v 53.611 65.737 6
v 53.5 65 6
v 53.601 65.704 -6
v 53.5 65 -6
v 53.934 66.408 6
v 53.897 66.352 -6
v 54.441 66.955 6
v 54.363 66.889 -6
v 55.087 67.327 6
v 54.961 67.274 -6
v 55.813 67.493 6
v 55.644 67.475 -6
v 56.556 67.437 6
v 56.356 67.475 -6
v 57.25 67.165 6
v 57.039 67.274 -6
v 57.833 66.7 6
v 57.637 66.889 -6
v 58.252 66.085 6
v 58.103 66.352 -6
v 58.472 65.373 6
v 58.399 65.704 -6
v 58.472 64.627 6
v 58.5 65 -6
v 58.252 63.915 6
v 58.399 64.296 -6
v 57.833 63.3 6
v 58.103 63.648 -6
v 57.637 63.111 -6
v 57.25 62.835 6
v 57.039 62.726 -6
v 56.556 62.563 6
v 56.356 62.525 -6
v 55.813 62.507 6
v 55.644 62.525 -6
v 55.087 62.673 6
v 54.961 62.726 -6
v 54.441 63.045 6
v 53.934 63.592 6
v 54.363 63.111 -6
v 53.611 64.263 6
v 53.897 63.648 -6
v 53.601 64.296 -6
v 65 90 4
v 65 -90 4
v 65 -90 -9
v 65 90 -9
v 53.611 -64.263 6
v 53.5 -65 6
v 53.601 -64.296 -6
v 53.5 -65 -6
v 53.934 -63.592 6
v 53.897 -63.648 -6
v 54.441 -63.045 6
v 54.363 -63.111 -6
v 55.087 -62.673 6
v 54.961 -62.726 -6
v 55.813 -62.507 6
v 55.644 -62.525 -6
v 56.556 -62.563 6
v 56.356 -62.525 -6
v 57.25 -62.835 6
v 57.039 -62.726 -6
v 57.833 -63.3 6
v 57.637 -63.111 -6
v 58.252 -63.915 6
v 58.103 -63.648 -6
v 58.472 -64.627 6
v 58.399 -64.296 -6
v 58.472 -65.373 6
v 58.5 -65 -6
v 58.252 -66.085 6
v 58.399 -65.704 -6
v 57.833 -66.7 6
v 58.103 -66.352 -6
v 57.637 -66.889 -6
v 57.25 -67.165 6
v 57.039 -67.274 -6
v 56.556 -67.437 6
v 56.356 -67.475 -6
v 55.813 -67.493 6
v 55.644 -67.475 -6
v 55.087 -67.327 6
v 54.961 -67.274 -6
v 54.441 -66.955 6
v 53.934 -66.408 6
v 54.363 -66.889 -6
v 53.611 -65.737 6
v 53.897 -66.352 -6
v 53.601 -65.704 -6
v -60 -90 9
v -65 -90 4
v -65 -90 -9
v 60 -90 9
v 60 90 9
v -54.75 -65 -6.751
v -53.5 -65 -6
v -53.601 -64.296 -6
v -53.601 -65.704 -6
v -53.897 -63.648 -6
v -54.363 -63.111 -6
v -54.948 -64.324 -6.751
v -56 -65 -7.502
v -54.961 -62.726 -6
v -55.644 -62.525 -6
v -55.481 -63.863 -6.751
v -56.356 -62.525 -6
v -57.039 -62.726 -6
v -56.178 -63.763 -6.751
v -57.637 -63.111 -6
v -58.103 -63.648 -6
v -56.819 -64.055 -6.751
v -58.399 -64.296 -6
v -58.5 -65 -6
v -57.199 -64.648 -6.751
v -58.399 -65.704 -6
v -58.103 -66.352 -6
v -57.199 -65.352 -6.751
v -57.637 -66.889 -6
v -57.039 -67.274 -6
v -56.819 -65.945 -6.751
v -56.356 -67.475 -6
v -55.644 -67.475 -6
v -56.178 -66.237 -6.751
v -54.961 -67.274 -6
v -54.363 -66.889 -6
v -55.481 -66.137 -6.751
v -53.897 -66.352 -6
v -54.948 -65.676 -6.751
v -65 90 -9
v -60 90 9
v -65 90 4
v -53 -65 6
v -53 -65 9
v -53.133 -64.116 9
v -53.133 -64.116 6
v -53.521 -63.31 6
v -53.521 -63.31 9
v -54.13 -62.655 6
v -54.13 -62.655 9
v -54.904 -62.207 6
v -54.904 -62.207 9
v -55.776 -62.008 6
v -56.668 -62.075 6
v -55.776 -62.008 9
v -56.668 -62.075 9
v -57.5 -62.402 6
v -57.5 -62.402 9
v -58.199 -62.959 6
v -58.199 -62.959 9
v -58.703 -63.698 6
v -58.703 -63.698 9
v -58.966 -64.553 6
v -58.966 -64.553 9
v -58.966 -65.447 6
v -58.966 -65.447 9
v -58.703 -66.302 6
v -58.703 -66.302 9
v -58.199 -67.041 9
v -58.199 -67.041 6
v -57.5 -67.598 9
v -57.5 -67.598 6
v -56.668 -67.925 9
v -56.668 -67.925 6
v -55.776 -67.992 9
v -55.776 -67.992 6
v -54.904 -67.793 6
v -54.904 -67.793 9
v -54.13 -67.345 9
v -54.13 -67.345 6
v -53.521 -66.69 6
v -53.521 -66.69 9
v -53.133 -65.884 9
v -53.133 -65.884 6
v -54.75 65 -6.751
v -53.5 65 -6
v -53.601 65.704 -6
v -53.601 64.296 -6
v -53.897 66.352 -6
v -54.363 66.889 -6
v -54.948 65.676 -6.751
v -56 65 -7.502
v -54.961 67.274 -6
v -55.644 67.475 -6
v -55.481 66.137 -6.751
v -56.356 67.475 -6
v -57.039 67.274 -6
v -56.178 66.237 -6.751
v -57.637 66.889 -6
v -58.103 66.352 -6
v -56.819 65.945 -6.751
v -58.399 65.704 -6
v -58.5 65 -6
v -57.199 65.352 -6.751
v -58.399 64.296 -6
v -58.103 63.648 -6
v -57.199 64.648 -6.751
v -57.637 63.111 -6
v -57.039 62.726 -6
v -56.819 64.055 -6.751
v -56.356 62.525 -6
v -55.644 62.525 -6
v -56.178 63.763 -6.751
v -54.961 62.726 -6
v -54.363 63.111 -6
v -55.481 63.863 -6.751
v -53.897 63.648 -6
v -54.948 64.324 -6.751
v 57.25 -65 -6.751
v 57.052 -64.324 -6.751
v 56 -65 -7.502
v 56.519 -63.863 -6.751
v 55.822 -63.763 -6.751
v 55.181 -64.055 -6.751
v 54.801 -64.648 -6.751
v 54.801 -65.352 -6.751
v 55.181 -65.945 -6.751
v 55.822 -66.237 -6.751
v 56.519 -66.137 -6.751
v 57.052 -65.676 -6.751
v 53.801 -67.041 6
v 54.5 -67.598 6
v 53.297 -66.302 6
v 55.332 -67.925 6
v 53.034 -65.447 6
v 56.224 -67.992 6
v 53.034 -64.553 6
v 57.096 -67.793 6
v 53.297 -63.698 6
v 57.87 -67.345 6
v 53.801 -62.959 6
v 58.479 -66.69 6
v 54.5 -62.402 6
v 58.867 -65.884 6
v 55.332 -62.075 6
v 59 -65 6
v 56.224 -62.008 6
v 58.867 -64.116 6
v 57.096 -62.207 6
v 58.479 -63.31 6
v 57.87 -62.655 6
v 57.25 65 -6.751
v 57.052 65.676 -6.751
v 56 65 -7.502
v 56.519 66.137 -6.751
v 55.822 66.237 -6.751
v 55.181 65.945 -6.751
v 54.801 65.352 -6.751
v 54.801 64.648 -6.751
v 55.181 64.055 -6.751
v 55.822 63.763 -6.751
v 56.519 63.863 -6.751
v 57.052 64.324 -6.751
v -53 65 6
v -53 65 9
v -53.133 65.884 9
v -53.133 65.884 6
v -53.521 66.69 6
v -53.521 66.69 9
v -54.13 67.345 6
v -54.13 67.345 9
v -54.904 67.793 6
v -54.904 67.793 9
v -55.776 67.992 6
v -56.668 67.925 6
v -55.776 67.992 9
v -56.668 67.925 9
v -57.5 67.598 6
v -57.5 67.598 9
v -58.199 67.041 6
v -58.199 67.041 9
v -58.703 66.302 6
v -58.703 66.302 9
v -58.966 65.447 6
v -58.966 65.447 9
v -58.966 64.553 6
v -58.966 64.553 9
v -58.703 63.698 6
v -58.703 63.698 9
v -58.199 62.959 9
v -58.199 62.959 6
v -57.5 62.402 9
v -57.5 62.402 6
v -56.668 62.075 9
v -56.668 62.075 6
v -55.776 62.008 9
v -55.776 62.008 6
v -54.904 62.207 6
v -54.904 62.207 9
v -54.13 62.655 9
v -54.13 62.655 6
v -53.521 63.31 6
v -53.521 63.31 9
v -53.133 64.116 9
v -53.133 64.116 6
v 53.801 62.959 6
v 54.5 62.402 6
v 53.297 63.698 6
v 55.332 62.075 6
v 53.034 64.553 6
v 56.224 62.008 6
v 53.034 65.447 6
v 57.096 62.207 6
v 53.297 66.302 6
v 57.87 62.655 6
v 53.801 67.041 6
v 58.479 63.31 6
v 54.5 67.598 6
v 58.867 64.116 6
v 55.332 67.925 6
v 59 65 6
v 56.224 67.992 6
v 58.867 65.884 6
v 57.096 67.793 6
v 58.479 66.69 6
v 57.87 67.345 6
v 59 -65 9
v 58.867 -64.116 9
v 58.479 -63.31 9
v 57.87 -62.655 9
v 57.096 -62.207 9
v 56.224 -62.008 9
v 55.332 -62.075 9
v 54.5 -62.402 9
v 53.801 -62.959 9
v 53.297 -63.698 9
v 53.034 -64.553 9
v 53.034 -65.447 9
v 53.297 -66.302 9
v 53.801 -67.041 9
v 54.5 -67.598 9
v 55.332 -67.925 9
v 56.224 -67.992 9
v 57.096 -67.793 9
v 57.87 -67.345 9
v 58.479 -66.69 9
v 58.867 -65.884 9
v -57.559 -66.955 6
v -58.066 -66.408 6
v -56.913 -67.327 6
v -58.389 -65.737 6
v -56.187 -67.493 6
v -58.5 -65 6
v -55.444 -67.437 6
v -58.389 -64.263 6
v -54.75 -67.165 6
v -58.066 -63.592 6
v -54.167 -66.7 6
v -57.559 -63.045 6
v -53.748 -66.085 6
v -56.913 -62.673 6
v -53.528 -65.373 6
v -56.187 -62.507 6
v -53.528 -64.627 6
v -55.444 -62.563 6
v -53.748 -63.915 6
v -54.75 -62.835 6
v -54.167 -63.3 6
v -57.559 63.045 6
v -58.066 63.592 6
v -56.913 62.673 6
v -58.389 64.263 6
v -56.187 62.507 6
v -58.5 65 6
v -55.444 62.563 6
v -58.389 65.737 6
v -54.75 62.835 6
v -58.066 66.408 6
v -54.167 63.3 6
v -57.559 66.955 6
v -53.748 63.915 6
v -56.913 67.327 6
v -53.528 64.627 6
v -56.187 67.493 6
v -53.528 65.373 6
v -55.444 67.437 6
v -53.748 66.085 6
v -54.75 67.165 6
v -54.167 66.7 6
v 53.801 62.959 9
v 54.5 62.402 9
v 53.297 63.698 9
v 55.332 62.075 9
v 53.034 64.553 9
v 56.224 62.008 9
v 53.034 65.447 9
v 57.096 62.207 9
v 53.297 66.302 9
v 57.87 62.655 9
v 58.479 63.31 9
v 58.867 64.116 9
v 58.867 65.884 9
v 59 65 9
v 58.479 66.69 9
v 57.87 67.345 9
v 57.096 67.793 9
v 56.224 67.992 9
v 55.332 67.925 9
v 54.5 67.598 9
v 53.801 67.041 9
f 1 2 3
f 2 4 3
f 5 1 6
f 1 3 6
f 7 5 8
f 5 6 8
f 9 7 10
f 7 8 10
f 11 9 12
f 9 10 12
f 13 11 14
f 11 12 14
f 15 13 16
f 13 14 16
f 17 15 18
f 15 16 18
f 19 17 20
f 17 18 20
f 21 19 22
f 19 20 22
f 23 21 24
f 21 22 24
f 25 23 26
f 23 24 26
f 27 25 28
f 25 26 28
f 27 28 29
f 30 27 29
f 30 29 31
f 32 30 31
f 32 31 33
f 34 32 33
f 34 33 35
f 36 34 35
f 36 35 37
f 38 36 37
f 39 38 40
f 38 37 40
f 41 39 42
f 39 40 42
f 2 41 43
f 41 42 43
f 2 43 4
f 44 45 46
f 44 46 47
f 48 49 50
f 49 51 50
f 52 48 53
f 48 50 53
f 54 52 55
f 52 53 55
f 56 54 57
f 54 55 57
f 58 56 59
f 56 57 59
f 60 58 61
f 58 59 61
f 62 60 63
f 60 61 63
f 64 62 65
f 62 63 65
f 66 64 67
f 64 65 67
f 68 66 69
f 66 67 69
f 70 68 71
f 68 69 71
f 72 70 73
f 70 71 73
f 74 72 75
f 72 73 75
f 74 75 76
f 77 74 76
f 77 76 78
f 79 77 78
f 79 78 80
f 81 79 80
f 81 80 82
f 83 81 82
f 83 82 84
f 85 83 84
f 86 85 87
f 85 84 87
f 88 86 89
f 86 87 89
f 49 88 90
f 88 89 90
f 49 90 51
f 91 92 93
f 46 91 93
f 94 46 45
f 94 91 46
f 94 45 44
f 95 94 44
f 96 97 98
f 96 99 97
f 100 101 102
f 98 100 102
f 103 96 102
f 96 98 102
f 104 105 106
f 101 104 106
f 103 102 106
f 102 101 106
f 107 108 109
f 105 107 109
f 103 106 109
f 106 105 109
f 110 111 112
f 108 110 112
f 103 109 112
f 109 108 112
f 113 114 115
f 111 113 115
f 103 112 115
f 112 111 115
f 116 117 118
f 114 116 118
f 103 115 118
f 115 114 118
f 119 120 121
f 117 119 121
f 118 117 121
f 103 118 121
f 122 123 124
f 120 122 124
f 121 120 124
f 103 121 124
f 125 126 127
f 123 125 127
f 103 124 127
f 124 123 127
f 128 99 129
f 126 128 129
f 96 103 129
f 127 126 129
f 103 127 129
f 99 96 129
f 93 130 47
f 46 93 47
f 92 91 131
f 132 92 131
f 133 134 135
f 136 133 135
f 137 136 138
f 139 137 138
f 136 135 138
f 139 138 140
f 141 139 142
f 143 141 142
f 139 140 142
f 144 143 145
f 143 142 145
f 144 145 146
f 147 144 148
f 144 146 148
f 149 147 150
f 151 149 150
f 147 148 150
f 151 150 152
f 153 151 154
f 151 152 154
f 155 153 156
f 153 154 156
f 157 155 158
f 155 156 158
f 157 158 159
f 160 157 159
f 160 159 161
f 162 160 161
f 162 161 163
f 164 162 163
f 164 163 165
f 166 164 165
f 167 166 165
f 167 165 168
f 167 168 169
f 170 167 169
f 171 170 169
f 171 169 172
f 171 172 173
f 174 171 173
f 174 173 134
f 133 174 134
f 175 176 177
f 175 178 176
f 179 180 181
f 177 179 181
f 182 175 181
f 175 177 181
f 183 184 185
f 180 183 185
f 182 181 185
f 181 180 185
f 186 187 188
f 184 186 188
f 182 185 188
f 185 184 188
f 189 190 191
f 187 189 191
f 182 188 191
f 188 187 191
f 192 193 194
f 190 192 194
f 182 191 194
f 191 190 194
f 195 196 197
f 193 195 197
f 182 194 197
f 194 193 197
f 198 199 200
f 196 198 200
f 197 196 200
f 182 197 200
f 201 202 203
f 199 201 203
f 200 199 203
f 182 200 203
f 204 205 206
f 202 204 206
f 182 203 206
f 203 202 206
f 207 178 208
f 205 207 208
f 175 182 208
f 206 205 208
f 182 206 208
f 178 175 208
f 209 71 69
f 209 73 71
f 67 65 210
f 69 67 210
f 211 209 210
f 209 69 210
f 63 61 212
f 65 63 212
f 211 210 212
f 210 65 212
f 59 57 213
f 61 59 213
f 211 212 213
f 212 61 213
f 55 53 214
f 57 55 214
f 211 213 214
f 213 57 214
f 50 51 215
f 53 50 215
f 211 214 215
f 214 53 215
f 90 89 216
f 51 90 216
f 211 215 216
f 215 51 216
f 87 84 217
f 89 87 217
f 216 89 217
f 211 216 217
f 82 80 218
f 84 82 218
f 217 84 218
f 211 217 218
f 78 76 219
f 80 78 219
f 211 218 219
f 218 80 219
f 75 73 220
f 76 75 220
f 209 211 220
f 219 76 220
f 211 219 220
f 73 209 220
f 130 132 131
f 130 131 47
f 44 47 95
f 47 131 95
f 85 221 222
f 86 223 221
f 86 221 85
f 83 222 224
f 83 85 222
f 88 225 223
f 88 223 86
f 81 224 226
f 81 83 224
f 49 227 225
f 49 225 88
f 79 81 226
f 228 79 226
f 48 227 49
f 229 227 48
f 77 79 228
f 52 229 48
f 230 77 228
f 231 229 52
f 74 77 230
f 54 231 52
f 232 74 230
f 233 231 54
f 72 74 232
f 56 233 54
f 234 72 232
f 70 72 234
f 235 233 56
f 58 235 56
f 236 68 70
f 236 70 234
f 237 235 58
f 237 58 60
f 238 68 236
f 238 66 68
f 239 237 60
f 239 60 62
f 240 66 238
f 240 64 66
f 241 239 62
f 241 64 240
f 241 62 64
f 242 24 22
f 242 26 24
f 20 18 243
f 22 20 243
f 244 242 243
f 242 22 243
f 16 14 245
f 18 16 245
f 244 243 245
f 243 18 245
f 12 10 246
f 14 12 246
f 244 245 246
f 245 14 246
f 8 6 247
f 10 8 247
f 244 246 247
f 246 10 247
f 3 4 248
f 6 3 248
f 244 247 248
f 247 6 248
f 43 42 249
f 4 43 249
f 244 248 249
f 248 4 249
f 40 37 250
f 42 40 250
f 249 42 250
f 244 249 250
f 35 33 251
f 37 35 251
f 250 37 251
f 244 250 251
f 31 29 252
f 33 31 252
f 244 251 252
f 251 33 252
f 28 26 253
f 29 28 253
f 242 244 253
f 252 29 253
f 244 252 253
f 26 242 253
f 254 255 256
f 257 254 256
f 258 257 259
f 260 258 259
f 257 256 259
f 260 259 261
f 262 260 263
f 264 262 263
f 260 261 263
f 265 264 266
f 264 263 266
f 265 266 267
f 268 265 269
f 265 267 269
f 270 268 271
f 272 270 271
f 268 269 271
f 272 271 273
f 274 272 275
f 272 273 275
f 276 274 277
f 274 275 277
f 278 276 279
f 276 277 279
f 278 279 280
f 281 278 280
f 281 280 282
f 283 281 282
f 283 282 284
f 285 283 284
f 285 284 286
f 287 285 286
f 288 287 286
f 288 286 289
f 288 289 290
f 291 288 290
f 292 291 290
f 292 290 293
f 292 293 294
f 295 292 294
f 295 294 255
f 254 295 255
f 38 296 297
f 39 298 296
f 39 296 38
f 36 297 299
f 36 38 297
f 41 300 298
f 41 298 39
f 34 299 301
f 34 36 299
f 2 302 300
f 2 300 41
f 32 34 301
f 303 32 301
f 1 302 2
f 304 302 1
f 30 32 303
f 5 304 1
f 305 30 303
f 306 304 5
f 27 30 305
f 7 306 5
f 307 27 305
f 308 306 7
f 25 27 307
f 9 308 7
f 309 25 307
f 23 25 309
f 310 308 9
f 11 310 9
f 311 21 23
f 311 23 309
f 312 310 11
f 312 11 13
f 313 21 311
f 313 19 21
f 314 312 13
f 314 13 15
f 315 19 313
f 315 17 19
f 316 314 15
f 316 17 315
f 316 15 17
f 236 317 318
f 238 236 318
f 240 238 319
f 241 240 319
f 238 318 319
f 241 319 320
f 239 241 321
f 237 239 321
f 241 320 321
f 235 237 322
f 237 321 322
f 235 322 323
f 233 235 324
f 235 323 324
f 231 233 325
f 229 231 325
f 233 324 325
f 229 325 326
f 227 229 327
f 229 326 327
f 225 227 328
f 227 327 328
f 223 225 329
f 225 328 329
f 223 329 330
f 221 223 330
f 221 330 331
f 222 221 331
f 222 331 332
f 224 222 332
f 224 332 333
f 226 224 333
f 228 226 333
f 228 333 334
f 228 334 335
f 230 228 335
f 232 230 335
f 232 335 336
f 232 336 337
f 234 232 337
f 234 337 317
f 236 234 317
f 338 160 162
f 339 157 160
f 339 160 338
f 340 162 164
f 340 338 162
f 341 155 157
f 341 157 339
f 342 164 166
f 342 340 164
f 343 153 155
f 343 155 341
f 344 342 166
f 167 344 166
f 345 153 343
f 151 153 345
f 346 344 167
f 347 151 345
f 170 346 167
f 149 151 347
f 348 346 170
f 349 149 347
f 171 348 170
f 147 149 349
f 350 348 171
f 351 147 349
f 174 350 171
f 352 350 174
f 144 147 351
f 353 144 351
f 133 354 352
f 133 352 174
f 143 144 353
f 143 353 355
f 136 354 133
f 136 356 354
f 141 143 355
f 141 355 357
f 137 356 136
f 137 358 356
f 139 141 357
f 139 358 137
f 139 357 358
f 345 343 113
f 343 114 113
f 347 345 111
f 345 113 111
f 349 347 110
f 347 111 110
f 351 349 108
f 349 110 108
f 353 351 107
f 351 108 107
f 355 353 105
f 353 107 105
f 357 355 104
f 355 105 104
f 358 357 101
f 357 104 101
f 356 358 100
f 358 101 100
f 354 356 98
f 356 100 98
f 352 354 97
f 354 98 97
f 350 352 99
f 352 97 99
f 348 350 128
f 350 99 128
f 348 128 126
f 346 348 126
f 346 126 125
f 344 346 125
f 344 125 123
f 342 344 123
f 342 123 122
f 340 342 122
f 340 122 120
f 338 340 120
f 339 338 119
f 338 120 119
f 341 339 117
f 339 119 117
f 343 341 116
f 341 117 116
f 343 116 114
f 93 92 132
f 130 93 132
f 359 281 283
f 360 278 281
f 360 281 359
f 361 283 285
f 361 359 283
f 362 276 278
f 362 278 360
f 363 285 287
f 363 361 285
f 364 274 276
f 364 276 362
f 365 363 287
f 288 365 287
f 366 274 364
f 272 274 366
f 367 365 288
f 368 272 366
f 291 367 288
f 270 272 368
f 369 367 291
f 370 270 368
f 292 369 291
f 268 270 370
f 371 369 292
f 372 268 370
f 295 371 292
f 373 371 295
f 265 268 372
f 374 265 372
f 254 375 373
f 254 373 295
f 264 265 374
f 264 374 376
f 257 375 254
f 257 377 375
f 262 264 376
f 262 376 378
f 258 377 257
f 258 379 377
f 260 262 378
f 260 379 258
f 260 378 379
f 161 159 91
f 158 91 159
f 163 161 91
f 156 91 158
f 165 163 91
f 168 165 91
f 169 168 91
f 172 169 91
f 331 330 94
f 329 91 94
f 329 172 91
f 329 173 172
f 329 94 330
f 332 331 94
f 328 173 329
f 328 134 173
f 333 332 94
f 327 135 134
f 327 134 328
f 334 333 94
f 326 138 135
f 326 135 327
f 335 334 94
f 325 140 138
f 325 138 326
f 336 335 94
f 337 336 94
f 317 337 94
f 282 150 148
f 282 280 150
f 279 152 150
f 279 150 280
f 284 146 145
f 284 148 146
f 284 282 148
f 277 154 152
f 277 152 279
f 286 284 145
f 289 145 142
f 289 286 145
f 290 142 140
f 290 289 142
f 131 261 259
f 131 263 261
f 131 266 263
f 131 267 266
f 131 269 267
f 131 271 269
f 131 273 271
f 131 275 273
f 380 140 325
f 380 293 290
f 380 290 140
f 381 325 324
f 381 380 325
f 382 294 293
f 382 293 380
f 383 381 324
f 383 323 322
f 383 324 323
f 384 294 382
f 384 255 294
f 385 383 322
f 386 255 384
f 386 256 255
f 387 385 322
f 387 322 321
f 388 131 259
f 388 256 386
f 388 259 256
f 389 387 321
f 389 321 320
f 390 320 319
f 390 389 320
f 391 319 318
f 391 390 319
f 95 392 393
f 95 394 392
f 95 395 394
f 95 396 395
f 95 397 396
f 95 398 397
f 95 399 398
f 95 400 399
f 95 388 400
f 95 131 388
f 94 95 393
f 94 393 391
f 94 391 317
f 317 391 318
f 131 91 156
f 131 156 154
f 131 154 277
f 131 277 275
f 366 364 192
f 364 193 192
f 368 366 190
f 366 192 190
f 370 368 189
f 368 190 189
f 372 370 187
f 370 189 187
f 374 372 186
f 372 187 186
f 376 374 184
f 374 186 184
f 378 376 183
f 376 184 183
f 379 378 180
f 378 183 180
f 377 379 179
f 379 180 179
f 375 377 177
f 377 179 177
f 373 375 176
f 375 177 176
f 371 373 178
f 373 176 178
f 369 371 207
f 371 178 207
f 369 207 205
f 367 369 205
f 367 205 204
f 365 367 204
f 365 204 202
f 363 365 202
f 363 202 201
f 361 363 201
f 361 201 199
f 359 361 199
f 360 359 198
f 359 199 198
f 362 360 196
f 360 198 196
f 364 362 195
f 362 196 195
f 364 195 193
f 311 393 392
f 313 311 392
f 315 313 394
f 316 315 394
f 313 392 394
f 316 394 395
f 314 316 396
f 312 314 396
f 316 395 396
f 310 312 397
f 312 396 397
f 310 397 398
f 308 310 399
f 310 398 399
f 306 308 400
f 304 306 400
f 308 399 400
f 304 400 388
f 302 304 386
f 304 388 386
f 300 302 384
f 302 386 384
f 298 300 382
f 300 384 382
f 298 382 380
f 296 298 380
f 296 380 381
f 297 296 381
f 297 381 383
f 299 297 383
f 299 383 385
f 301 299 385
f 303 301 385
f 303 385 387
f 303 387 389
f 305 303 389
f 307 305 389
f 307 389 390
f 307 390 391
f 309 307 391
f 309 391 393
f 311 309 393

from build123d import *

# Parameters (mm, degrees)
F0_W           = 130
F0_H           = 180
F1_DEPTH       = 9
F3_D           = 5
F3_DEPTH       = 15
F3_CBORE_D     = 6
F3_CBORE_DEPTH = 3
F3_TIP         = 1.5021515476
F4_SIZE        = 5


with BuildPart() as f1:
    # F0 (on Top) → F1 (new body, symmetric)
    with BuildSketch(Plane.XY):
        Rectangle(F0_W, F0_H)
    extrude(amount=F1_DEPTH, both=True)

    # F3
    with Locations(Plane.XY.offset(9)):
        with Locations((-56, 65), (56, 65), (56, -65), (-56, -65)):
            CounterBoreHole(F3_D / 2, F3_CBORE_D / 2, F3_CBORE_DEPTH, depth=F3_DEPTH)
            with Locations((0, 0, -(F3_DEPTH + F3_TIP / 2))):  # 118° drill point
                Cone(0, F3_D / 2, F3_TIP, mode=Mode.SUBTRACT)

    # F4
    f4_edges = [f1.edges().sort_by_distance(p)[0] for p in [
        (-65, 0, 9),
        (65, 0, 9),
    ]]
    chamfer(f4_edges, length=F4_SIZE)


solid = f1.part
